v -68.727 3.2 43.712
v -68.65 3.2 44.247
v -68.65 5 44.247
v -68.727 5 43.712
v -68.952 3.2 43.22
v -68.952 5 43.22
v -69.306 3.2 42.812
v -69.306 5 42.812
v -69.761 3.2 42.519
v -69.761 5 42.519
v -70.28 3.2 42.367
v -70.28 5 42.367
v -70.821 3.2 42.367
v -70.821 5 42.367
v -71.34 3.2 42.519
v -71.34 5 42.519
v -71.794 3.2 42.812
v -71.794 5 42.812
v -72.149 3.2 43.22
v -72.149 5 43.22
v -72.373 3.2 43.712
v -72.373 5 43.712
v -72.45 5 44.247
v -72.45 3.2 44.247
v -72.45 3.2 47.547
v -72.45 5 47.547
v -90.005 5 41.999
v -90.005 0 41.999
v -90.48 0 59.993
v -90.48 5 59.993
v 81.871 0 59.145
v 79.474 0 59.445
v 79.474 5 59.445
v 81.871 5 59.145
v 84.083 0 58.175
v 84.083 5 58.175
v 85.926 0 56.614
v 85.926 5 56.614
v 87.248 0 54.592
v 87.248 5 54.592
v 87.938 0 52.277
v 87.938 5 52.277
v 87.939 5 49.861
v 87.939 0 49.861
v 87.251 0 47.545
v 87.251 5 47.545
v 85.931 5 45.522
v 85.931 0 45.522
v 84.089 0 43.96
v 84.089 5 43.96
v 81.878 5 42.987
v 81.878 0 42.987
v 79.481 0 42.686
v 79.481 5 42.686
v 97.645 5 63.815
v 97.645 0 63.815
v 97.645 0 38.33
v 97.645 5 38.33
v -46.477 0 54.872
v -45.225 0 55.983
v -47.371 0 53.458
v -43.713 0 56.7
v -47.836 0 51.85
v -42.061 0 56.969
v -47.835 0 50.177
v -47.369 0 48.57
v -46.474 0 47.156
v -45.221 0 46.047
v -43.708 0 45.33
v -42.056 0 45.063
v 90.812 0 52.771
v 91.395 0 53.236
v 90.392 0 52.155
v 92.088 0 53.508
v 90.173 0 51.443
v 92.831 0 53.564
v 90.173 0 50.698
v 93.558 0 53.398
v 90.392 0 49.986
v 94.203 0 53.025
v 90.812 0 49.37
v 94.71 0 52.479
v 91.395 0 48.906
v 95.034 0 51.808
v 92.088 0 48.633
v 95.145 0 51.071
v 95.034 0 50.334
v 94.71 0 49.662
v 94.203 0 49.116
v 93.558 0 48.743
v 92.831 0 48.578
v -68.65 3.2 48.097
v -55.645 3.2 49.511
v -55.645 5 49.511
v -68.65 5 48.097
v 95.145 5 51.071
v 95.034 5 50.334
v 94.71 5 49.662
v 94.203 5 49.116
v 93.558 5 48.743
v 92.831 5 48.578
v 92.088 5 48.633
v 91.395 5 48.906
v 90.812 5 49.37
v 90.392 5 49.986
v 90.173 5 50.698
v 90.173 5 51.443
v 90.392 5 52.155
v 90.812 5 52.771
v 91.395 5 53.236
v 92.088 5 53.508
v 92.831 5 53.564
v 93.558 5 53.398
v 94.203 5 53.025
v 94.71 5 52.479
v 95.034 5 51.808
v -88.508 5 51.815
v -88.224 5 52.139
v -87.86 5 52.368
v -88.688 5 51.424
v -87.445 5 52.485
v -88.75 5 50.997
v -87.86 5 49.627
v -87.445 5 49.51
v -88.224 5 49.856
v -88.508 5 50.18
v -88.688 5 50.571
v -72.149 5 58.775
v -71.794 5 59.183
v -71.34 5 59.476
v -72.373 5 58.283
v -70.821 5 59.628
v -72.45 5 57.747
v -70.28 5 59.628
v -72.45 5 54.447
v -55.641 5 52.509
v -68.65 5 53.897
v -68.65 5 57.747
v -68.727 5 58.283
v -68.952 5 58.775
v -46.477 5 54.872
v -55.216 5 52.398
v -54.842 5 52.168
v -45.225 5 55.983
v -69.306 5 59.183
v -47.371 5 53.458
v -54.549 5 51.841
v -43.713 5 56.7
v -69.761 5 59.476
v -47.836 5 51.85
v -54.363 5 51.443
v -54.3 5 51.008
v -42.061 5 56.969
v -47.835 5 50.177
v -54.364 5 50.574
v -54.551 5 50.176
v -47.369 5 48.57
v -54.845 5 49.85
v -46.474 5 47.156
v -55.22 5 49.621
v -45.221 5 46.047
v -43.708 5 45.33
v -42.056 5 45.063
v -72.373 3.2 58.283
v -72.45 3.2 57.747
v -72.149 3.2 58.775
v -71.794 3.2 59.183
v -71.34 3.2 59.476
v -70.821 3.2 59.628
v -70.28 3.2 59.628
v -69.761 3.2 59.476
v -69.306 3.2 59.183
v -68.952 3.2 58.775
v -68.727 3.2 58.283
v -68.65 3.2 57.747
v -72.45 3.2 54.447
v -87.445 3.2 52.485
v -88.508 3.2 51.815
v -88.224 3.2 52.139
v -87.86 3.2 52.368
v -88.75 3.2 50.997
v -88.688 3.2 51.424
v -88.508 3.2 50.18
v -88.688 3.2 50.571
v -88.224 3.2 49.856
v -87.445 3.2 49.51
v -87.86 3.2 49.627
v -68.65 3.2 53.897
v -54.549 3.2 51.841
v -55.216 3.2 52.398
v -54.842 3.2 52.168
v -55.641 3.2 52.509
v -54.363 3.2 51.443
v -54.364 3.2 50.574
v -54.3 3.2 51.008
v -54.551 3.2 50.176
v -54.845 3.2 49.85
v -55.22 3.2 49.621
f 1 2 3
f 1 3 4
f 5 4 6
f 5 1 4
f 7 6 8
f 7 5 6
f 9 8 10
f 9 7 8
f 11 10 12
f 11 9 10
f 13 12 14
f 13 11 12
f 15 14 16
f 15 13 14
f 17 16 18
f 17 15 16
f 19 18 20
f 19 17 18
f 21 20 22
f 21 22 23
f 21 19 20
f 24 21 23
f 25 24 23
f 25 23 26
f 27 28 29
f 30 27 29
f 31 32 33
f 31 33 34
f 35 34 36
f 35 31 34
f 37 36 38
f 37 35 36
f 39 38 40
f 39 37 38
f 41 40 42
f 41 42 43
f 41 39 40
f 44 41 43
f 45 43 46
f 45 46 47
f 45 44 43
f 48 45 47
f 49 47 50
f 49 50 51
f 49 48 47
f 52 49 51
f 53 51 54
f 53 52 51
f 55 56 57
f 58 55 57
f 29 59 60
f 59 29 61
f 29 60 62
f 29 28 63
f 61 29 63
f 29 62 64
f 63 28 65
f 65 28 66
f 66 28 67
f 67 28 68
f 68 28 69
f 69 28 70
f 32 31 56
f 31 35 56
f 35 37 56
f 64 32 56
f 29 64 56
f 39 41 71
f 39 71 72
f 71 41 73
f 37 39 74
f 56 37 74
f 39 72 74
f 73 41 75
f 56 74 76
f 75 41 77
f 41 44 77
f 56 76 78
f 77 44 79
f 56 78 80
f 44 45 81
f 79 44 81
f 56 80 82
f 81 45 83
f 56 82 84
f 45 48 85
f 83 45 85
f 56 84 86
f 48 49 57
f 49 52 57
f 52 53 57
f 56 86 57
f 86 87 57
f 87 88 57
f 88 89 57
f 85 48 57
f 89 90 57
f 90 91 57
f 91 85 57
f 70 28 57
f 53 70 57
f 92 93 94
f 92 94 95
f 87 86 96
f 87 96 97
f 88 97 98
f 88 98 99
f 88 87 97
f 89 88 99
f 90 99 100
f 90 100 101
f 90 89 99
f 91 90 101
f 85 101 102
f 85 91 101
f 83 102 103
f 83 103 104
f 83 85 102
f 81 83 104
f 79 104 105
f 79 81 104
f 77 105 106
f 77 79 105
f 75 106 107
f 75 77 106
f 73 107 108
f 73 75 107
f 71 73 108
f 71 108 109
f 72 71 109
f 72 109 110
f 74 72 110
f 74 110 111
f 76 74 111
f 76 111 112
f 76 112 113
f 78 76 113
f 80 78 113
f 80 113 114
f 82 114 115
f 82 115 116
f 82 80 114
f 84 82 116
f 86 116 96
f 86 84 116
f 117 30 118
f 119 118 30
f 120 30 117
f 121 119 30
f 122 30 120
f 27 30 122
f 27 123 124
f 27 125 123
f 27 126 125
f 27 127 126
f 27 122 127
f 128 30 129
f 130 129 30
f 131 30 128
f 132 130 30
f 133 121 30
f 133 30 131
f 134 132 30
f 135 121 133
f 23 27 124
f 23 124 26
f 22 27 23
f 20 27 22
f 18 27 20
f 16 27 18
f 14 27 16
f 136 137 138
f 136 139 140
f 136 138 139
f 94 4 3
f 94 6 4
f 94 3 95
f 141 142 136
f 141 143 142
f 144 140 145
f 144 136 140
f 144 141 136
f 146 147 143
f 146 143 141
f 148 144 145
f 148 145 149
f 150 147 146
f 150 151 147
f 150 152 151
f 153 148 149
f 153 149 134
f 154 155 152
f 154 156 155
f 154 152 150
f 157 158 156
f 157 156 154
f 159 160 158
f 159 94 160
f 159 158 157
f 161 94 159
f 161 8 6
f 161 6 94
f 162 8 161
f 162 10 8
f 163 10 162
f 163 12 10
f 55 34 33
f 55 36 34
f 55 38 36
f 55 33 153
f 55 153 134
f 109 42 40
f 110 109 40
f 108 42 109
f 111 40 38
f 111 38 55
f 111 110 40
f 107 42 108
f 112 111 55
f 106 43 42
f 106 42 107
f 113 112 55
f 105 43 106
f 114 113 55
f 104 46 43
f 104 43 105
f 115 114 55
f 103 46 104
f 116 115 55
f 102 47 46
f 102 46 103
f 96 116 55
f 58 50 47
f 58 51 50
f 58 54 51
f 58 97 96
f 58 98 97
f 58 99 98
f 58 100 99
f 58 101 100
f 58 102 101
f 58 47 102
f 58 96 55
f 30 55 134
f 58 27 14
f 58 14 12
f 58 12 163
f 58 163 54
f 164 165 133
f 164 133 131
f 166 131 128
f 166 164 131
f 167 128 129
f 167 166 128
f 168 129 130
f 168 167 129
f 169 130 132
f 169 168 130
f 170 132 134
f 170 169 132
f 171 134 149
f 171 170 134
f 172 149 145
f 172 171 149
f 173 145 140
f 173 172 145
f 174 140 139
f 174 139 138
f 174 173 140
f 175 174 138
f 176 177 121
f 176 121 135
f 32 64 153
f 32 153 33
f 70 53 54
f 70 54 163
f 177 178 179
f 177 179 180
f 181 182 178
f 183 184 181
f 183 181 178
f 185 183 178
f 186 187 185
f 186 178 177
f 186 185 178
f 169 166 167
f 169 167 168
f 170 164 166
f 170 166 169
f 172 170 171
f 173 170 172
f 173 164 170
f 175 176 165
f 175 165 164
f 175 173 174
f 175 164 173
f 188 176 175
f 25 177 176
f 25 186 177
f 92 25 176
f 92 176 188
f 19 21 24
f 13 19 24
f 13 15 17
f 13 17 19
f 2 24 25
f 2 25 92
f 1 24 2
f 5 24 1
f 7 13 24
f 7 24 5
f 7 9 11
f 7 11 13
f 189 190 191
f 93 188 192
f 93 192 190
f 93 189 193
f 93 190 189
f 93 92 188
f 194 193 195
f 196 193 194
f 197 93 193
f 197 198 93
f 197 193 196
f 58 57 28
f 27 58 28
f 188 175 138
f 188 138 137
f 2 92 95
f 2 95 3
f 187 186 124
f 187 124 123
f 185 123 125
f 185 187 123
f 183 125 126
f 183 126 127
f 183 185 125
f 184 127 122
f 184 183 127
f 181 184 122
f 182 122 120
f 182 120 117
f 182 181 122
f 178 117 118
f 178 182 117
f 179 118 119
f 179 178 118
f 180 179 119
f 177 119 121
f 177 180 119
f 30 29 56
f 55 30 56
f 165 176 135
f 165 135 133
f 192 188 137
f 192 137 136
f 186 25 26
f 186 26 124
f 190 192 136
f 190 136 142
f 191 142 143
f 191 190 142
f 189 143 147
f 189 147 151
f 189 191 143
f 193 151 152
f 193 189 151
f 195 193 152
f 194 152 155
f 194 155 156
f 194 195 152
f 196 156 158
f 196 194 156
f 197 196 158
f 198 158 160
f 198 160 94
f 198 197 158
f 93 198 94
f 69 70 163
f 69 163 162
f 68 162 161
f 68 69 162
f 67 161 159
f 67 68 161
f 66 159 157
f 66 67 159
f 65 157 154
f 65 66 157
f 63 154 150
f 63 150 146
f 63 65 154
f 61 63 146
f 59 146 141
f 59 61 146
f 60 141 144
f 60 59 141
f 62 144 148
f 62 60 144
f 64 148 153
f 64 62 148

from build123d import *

# Parameters (mm, degrees)
SKETCH1_R           = 2.5
BOSS_EXTRUDE1_DEPTH = 5
BOSS_EXTRUDE2_DEPTH = 3.2


with BuildPart() as part:
    # Sketch1 → Boss-Extrude1 (new body)
    with BuildSketch(Plane(origin=(0, 0, 0), x_dir=(1, 0, 0), z_dir=(0, 1, 0))):
        Polygon((-90.005103209, -41.999399148), (-90.480022259, -59.993132832), (97.6446575, -63.815482804), (97.6446575, -38.32994317), (-49.807795153, -41.213348306), align=None)
        with BuildLine():
            Line((-72.450254412, -47.547483492), (-72.450254412, -44.247483492))
            ThreePointArc((-72.450254412, -44.247483492), (-70.550254412, -42.347483492), (-68.650254412, -44.247483492))
            Line((-68.650254412, -44.247483492), (-68.650254412, -48.097483492))
            Line((-68.650254412, -48.097483492), (-55.644843725, -49.510975235))
            ThreePointArc((-55.644843725, -49.510975235), (-54.299665811, -51.008287292), (-55.640888759, -52.509143053))
            Line((-55.640888759, -52.509143053), (-68.650254412, -53.897483492))
            Line((-68.650254412, -53.897483492), (-68.650254412, -57.747483492))
            ThreePointArc((-68.650254412, -57.747483492), (-70.550254412, -59.647483492), (-72.450254412, -57.747483492))
            Line((-72.450254412, -57.747483492), (-72.450254412, -54.447483492))
            Line((-72.450254412, -54.447483492), (-87.444932153, -52.484796699))
            ThreePointArc((-87.444932153, -52.484796699), (-88.750254412, -50.997483492), (-87.444932153, -49.510170284))
            Line((-87.444932153, -49.510170284), (-72.450254412, -47.547483492))
        make_face(mode=Mode.SUBTRACT)
        with BuildLine():
            Line((-42.056384532, -45.062535629), (79.480798132, -42.685898751))
            ThreePointArc((79.480798132, -42.685898751), (88.025749222, -51.068799274), (79.473979342, -59.444743533))
            Line((79.473979342, -59.444743533), (-42.061229083, -56.969206079))
            ThreePointArc((-42.061229083, -56.969206079), (-47.894488465, -51.013496449), (-42.056384532, -45.062535629))
        make_face(mode=Mode.SUBTRACT)
        with Locations((92.6446575, -51.070678602)):
            Circle(SKETCH1_R, mode=Mode.SUBTRACT)
    extrude(amount=BOSS_EXTRUDE1_DEPTH)

    # Sketch1<16> → Boss-Extrude2 (add)
    with BuildSketch(Plane(origin=(0, 0, 0), x_dir=(1, 0, 0), z_dir=(0, 1, 0))):
        with BuildLine():
            Line((-72.450254412, -44.247483492), (-72.450254412, -47.547483492))
            Line((-72.450254412, -47.547483492), (-87.444932153, -49.510170284))
            ThreePointArc((-87.444932153, -49.510170284), (-88.750254412, -50.997483492), (-87.444932153, -52.484796699))
            Line((-87.444932153, -52.484796699), (-72.450254412, -54.447483492))
            Line((-72.450254412, -54.447483492), (-72.450254412, -57.747483492))
            ThreePointArc((-72.450254412, -57.747483492), (-70.550254412, -59.647483492), (-68.650254412, -57.747483492))
            Line((-68.650254412, -57.747483492), (-68.650254412, -53.897483492))
            Line((-68.650254412, -53.897483492), (-55.640888759, -52.509143053))
            ThreePointArc((-55.640888759, -52.509143053), (-54.299665811, -51.008287292), (-55.644843725, -49.510975235))
            Line((-55.644843725, -49.510975235), (-68.650254412, -48.097483492))
            Line((-68.650254412, -48.097483492), (-68.650254412, -44.247483492))
            ThreePointArc((-68.650254412, -44.247483492), (-70.550254412, -42.347483492), (-72.450254412, -44.247483492))
        make_face()
    extrude(amount=BOSS_EXTRUDE2_DEPTH)


solid = part.part
